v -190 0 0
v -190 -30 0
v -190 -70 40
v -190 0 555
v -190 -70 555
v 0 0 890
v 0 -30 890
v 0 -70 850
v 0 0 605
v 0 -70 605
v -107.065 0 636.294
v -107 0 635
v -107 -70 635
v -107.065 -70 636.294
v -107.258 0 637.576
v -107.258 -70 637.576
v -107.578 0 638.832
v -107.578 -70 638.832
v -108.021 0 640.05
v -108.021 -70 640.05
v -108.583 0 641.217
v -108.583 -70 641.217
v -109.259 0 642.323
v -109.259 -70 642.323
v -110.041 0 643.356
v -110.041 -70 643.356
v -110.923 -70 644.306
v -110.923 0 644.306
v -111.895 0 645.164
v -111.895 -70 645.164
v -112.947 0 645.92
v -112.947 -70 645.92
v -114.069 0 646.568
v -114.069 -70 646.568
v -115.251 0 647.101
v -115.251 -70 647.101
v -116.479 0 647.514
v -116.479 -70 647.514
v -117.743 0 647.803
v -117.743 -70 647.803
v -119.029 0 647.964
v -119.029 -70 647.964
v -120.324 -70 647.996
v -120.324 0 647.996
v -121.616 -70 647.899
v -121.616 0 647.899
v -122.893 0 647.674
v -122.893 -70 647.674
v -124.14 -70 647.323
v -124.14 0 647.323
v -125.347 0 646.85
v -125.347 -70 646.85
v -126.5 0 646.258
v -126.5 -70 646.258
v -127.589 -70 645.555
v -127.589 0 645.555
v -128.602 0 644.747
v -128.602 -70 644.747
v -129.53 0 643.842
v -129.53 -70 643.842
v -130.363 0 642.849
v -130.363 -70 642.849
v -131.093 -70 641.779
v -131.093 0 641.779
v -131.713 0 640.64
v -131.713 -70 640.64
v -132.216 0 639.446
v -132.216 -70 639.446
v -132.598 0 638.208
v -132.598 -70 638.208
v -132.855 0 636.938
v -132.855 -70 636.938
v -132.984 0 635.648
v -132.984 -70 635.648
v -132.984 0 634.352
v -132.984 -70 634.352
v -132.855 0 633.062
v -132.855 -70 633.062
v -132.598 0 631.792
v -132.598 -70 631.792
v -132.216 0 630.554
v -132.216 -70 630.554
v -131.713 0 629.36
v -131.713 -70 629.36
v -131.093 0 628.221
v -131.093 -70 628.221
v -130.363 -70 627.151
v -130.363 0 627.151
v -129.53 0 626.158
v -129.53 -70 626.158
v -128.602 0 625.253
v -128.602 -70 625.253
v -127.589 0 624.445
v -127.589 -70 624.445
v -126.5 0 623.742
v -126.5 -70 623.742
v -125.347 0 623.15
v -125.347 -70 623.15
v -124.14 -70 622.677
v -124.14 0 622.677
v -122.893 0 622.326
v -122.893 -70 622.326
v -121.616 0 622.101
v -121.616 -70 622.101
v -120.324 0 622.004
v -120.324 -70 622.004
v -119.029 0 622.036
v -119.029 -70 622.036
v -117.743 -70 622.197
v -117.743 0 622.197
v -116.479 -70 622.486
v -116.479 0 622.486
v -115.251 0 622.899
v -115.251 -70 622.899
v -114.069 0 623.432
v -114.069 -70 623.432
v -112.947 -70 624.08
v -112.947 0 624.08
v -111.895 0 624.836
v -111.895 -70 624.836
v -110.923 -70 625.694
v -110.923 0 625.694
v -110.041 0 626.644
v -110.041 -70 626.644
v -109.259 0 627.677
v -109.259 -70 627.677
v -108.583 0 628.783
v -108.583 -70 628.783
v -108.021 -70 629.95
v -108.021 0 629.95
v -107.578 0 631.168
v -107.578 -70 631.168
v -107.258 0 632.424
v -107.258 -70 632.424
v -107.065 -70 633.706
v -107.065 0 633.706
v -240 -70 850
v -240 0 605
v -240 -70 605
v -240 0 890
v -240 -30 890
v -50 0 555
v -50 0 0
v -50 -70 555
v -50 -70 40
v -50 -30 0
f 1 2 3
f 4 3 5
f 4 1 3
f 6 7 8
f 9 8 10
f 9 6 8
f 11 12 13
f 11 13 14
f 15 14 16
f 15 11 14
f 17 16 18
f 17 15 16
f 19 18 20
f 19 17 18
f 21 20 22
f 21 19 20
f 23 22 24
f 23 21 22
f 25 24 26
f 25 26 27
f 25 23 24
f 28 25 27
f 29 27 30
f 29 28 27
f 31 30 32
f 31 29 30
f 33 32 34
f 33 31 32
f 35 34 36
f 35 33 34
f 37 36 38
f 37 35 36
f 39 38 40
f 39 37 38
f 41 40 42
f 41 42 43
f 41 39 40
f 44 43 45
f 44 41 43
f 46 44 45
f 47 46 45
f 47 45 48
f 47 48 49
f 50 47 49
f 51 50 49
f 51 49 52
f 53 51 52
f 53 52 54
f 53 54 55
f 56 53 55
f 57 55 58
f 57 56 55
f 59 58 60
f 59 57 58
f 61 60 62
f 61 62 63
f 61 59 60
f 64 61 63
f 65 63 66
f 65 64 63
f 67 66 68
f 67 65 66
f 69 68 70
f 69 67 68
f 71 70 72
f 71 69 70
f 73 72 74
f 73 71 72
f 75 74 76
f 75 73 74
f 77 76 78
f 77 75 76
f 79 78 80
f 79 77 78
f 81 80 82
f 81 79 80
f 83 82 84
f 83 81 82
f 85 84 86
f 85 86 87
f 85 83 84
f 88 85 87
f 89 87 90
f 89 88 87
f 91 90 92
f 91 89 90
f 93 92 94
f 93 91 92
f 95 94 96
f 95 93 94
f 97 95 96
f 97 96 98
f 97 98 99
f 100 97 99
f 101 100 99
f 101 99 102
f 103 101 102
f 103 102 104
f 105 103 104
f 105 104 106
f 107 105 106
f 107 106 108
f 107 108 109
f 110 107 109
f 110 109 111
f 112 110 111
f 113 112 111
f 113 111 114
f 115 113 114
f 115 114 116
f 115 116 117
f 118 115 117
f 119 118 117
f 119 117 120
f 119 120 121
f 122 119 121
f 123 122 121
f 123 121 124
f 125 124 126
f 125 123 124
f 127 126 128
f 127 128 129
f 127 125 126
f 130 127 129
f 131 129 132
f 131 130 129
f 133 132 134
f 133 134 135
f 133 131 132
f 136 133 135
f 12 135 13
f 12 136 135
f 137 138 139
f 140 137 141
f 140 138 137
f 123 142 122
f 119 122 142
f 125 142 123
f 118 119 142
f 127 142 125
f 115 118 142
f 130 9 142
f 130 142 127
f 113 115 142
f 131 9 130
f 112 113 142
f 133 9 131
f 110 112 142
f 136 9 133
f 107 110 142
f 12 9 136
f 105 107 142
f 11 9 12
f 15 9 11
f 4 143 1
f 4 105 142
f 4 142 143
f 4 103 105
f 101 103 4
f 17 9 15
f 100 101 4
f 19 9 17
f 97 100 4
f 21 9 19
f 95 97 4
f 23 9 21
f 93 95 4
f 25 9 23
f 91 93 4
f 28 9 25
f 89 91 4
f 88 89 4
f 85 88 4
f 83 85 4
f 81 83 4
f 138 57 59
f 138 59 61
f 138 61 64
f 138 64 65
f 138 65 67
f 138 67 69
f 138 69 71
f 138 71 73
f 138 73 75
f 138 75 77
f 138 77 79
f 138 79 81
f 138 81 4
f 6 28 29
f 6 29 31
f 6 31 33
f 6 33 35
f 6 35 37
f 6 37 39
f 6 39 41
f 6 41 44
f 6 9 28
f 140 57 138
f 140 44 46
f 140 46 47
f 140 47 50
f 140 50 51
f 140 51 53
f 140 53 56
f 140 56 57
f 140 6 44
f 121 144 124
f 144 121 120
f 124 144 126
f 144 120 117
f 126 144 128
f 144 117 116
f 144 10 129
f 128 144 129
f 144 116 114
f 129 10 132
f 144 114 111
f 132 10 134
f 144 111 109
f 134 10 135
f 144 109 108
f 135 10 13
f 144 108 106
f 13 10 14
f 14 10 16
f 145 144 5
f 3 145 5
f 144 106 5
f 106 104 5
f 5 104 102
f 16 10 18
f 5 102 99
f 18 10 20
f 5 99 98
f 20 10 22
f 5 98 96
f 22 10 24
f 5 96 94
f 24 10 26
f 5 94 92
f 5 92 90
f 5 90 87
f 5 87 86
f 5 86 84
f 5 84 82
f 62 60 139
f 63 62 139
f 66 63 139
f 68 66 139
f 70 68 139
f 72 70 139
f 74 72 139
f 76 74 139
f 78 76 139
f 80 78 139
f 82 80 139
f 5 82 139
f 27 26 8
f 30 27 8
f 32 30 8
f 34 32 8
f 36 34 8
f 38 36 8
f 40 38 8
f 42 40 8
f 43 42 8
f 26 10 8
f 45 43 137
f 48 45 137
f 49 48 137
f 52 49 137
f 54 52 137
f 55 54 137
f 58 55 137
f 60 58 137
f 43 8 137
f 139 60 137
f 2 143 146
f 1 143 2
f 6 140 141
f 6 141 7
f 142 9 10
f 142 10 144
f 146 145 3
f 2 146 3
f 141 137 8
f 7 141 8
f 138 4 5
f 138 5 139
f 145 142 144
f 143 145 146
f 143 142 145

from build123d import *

# Parameters (mm, degrees)
SKETCH_R     = 13
PAD_DEPTH    = 70
CHAMFER_SIZE = 40


with BuildPart() as part:
    # Sketch → Pad (new body)
    with BuildSketch(Plane.XZ):
        Polygon((-50, 0), (-190, 0), (-190, 555), (-240, 605), (-240, 890), (0, 890), (0, 605), (-50, 555), align=None)
        with Locations((-120, 635)):
            Circle(SKETCH_R, mode=Mode.SUBTRACT)
    extrude(amount=PAD_DEPTH)

    # Chamfer
    chamfer_edges = [part.edges().sort_by_distance(p)[0] for p in [
        (-120, -70, 890),
        (-120, -70, 0),
    ]]
    chamfer(chamfer_edges, length=CHAMFER_SIZE)


solid = part.part
